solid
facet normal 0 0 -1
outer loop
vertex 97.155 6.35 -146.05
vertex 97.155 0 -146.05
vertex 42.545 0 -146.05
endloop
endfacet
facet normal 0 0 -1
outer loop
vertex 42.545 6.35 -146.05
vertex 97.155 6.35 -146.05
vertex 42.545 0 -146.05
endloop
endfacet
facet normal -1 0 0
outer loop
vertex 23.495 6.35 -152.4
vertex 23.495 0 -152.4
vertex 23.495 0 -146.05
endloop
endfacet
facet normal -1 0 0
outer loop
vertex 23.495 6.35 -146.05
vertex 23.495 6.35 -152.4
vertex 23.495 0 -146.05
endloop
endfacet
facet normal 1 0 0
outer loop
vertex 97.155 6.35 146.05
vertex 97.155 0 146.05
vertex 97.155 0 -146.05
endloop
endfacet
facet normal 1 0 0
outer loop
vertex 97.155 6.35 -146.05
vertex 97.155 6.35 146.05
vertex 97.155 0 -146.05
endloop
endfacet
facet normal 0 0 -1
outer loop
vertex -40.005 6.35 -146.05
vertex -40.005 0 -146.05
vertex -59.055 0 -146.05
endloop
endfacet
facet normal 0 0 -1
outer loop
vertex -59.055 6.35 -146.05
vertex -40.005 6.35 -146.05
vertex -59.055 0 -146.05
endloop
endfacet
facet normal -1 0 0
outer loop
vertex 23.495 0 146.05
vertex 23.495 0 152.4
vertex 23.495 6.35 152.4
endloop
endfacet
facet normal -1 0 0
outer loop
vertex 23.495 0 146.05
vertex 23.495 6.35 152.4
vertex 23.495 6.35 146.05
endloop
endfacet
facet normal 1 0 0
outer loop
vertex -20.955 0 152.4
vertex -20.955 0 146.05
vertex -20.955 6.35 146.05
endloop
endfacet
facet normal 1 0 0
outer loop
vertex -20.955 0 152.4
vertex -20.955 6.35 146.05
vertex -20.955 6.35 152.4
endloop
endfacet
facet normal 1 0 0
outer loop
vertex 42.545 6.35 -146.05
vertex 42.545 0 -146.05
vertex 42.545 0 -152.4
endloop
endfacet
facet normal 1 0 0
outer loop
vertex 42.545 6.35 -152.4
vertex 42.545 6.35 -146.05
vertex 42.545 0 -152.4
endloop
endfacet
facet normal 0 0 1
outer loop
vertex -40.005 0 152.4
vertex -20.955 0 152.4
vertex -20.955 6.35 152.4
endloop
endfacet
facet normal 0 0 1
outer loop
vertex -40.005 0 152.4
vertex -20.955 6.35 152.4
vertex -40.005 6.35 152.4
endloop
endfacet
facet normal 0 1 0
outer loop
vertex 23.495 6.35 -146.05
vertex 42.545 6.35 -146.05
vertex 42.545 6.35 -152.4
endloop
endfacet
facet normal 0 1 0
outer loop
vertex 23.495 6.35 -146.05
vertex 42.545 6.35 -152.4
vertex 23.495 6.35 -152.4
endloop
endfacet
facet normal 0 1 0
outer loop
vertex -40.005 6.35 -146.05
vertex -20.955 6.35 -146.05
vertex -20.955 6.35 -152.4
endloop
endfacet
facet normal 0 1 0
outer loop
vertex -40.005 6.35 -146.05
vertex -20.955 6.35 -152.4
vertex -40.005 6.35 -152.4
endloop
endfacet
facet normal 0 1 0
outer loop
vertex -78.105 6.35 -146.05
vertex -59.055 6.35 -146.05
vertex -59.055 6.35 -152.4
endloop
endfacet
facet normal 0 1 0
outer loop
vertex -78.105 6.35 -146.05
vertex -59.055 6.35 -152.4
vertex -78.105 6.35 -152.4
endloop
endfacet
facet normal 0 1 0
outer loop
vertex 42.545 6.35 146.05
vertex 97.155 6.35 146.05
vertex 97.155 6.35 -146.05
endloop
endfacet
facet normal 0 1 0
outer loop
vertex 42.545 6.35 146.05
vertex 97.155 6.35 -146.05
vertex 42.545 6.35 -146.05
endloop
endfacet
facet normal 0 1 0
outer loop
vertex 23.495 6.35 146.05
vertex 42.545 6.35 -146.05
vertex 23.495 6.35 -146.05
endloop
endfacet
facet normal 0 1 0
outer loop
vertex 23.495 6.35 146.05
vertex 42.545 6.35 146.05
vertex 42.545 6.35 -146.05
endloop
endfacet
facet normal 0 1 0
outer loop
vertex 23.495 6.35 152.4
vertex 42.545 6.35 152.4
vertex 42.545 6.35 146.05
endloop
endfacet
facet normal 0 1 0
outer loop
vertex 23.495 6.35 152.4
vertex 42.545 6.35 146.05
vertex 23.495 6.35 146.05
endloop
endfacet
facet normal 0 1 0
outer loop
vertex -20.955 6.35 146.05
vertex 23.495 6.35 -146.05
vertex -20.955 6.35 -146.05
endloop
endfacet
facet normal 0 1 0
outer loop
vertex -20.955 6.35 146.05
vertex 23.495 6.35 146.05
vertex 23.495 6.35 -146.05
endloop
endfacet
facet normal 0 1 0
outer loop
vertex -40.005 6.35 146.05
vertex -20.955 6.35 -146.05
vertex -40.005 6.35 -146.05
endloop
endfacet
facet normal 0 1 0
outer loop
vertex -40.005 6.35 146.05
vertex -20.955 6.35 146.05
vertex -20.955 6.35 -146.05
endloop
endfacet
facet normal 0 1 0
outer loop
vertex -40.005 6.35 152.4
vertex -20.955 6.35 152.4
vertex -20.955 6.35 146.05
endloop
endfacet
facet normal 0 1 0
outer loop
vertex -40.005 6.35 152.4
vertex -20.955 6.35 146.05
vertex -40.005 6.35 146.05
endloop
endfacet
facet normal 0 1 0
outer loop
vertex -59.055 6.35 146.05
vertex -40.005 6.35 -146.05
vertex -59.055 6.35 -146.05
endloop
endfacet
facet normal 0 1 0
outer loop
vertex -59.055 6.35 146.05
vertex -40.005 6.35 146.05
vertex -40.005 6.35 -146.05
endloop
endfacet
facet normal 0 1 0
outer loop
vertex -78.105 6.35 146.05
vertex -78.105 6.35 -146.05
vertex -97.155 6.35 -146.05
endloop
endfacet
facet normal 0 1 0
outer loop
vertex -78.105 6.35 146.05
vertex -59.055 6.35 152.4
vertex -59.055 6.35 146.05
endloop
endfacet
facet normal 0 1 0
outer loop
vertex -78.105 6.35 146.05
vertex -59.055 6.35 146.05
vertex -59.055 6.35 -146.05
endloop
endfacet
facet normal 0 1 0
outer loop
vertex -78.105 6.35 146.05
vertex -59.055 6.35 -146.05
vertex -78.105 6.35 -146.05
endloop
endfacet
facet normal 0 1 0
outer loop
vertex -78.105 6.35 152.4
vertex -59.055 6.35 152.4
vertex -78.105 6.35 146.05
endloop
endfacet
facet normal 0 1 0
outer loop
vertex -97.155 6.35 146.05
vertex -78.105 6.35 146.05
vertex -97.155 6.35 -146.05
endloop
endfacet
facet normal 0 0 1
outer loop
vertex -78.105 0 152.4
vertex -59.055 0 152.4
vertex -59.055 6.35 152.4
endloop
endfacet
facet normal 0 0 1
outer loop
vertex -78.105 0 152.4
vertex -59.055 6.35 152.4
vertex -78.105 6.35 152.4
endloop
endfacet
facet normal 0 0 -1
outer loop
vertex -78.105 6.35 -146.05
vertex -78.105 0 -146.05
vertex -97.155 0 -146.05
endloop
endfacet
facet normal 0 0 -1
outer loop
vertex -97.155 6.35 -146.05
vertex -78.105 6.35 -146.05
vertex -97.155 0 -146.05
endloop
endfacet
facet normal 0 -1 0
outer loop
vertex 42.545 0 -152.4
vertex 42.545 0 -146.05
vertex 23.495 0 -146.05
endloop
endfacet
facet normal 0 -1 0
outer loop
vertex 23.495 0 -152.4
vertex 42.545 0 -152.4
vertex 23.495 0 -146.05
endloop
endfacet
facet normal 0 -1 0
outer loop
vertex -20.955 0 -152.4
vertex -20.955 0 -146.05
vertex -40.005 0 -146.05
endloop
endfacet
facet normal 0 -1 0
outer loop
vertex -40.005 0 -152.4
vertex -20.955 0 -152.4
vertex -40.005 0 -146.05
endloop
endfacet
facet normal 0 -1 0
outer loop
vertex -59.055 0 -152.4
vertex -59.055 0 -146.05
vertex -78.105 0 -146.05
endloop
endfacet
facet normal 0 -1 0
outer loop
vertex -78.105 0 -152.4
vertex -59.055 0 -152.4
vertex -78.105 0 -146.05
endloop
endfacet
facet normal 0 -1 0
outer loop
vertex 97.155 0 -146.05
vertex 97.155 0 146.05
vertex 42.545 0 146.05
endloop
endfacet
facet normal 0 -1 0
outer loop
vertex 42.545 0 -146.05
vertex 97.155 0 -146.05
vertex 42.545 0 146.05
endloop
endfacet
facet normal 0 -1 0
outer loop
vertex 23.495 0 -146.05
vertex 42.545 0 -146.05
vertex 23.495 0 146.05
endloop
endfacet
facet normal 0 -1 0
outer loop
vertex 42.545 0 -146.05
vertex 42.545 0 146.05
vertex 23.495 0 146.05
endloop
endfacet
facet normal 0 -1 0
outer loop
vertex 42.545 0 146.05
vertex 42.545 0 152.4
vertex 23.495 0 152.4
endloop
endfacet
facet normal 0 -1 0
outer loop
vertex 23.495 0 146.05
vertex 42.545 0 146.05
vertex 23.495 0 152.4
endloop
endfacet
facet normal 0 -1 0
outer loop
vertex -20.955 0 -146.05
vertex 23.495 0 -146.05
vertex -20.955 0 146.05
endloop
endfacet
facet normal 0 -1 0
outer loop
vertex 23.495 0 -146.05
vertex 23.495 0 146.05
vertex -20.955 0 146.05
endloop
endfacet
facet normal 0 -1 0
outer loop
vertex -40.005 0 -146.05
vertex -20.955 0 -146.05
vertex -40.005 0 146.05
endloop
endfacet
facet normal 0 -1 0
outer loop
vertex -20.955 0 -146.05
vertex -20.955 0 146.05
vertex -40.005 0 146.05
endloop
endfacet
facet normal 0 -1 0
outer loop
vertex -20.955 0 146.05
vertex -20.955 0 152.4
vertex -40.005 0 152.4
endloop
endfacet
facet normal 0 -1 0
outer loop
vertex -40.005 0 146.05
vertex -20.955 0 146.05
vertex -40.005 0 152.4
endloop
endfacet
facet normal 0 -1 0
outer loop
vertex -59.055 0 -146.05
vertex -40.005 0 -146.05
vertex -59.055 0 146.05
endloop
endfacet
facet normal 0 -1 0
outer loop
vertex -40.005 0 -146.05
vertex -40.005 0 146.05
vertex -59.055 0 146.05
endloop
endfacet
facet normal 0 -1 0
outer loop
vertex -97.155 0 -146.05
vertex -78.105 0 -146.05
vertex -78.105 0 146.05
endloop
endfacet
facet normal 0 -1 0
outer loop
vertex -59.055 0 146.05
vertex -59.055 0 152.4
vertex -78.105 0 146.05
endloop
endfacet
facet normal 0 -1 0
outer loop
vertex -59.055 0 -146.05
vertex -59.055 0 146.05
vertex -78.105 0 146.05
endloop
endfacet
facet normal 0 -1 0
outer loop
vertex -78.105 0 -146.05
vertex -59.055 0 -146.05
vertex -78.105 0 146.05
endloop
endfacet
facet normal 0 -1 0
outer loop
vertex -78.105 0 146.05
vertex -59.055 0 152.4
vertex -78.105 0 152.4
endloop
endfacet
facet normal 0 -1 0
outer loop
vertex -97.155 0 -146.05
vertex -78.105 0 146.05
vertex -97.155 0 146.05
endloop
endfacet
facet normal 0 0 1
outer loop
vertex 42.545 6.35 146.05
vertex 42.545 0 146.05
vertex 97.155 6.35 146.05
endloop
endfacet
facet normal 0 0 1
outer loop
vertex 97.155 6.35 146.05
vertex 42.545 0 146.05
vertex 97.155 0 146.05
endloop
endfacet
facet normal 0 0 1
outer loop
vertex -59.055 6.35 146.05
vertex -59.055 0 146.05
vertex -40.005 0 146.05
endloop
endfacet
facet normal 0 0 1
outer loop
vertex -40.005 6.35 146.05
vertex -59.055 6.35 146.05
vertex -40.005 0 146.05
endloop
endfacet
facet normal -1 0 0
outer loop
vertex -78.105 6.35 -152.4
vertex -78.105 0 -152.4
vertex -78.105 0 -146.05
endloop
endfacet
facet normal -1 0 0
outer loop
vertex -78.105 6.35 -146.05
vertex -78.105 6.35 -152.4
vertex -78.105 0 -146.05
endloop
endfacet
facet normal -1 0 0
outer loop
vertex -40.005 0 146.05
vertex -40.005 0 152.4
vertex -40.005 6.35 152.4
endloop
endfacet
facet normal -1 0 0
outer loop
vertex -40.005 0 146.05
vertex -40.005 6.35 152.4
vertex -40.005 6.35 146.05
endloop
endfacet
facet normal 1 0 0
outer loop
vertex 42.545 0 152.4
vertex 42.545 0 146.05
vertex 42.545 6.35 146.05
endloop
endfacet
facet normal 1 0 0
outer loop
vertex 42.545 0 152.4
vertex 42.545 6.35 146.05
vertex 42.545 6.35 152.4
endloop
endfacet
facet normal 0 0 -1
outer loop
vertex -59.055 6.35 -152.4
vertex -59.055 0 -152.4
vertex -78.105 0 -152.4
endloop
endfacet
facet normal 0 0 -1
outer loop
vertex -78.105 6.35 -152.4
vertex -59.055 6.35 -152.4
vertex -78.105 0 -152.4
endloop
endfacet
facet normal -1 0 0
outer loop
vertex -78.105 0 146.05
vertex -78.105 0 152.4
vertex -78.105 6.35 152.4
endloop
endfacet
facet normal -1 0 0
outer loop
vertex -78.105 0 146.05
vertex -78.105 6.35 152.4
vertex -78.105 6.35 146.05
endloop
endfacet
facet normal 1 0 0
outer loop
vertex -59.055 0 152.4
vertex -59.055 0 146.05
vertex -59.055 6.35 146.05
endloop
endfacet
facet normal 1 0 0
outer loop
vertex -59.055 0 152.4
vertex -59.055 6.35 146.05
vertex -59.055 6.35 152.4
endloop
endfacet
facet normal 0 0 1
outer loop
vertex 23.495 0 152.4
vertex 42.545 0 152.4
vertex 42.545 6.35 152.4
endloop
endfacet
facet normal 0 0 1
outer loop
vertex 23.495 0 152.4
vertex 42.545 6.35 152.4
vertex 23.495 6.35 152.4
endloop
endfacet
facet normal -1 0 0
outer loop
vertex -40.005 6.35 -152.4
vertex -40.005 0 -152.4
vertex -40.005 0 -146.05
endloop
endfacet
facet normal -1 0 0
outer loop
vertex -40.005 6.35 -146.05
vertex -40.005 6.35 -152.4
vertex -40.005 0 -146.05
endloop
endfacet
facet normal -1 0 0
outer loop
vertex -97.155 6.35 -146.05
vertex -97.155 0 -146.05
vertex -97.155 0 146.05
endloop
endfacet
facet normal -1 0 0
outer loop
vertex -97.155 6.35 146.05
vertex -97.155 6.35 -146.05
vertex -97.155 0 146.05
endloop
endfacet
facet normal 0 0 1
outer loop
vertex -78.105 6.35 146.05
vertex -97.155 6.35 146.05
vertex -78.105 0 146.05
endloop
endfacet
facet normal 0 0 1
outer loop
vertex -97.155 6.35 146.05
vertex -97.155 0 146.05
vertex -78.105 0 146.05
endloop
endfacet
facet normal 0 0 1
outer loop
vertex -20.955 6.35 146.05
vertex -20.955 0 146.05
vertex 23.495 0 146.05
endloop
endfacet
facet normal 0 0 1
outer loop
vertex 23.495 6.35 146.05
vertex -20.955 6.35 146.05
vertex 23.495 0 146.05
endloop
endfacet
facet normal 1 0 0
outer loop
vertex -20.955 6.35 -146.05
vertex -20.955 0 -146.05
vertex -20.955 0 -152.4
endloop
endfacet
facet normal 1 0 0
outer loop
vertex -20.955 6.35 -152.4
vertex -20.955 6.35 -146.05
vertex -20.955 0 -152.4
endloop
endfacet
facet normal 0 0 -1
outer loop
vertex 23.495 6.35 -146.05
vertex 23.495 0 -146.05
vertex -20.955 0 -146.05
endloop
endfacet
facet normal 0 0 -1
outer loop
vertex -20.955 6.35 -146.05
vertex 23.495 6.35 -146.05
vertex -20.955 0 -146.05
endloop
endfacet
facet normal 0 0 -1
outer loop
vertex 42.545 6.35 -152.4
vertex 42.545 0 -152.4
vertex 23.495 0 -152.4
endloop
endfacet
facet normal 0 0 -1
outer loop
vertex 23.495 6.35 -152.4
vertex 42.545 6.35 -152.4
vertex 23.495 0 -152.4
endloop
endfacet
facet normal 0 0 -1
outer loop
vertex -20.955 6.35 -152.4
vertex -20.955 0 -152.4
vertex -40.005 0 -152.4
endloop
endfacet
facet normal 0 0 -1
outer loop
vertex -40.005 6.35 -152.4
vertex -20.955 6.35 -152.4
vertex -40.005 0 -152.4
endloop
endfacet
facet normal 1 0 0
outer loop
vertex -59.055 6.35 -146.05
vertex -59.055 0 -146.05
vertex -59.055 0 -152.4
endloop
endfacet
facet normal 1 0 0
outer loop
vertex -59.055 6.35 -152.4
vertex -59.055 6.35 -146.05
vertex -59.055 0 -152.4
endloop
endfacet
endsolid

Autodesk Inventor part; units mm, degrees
ref_plane "YZ Plane" through (0, 0, 0) normal (1, 0, 0) x (0, 1, 0)
ref_plane "XZ Plane" through (0, 0, 0) normal (0, 1, 0) x (-1, 0, 0)
ref_plane "XY Plane" through (0, 0, 0) normal (0, 0, 1) x (1, 0, 0)
sketch "Sketch1" plane through (0, 0, 0) normal (0, 1, 0) x (-1, 0, 0)
  line L0 (97.155, 146.05) -> (-97.155, 146.05)
  line L1 (-97.155, 146.05) -> (-97.155, -146.05)
  line L2 (-97.155, -146.05) -> (97.155, -146.05)
  line L3 (97.155, -146.05) -> (97.155, 146.05)
  line L4 (97.155, 146.05) -> (-97.155, -146.05) construction
  line L5 (-97.155, 146.05) -> (97.155, -146.05) construction
  line L6 (97.155, -146.05) -> (78.105, -146.05)
  line L7 (78.105, -146.05) -> (59.055, -146.05)
  line L8 (59.055, -146.05) -> (59.055, -152.4)
  line L9 (59.055, -152.4) -> (78.105, -152.4)
  line L10 (78.105, -152.4) -> (78.105, -146.05)
  line L11 (40.005, -146.05) -> (20.955, -146.05)
  line L12 (40.005, -152.4) -> (40.005, -146.05)
  line L13 (20.955, -146.05) -> (20.955, -152.4)
  line L14 (20.955, -152.4) -> (40.005, -152.4)
  line L15 (1.905, -146.05) -> (-17.145, -146.05)
  line L16 (1.905, -152.4) -> (1.905, -146.05)
  line L17 (-17.145, -146.05) -> (-17.145, -152.4)
  line L18 (-17.145, -152.4) -> (1.905, -152.4)
  line L19 (78.105, 146.05) -> (59.055, 146.05)
  line L20 (59.055, 146.05) -> (59.055, 152.4)
  line L21 (59.055, 152.4) -> (78.105, 152.4)
  line L22 (78.105, 152.4) -> (78.105, 146.05)
  line L23 (40.005, 146.05) -> (20.955, 146.05)
  line L24 (40.005, 152.4) -> (40.005, 146.05)
  line L25 (20.955, 146.05) -> (20.955, 152.4)
  line L26 (20.955, 152.4) -> (40.005, 152.4)
  line L27 (1.905, 146.05) -> (-17.145, 146.05)
  line L28 (1.905, 152.4) -> (1.905, 146.05) construction
  line L29 (-17.145, 146.05) -> (-17.145, 152.4) construction
  line L30 (-17.145, 152.4) -> (1.905, 152.4) construction
  line L31 (-23.495, 152.4) -> (-23.495, 146.05)
  line L32 (-23.495, 146.05) -> (-42.545, 146.05)
  line L33 (-42.545, 146.05) -> (-42.545, 152.4)
  line L34 (-42.545, 152.4) -> (-23.495, 152.4)
  line L35 (-23.495, 146.05) -> (-42.545, 146.05)
  line L36 (-23.495, -152.4) -> (-23.495, -146.05)
  line L37 (-23.495, -146.05) -> (-42.545, -146.05)
  line L38 (-42.545, -146.05) -> (-42.545, -152.4)
  line L39 (-42.545, -152.4) -> (-23.495, -152.4)
  point P0 (0, 0)
  dimension "d0" = 292.1
  dimension "d1" = 194.31
  dimension "d2" = 19.05
  dimension "d3" = 19.05
  dimension "d4" = 6.35
  dimension "d7" = 38.1
  dimension "d14" = 6.35
  dimension "d15" = 19.05
extrude "Extrusion2" add sketch "Sketch1" along normal blind 6.35 contours L3 L2 L1 L0 | L0 L20 L21 L22 | L10 L9 L8 L2 | L0 L25 L26 L24 | L12 L14 L13 L2 | L0 L33 L34 L31 | L36 L39 L38 L2
properties part number "ramp"
